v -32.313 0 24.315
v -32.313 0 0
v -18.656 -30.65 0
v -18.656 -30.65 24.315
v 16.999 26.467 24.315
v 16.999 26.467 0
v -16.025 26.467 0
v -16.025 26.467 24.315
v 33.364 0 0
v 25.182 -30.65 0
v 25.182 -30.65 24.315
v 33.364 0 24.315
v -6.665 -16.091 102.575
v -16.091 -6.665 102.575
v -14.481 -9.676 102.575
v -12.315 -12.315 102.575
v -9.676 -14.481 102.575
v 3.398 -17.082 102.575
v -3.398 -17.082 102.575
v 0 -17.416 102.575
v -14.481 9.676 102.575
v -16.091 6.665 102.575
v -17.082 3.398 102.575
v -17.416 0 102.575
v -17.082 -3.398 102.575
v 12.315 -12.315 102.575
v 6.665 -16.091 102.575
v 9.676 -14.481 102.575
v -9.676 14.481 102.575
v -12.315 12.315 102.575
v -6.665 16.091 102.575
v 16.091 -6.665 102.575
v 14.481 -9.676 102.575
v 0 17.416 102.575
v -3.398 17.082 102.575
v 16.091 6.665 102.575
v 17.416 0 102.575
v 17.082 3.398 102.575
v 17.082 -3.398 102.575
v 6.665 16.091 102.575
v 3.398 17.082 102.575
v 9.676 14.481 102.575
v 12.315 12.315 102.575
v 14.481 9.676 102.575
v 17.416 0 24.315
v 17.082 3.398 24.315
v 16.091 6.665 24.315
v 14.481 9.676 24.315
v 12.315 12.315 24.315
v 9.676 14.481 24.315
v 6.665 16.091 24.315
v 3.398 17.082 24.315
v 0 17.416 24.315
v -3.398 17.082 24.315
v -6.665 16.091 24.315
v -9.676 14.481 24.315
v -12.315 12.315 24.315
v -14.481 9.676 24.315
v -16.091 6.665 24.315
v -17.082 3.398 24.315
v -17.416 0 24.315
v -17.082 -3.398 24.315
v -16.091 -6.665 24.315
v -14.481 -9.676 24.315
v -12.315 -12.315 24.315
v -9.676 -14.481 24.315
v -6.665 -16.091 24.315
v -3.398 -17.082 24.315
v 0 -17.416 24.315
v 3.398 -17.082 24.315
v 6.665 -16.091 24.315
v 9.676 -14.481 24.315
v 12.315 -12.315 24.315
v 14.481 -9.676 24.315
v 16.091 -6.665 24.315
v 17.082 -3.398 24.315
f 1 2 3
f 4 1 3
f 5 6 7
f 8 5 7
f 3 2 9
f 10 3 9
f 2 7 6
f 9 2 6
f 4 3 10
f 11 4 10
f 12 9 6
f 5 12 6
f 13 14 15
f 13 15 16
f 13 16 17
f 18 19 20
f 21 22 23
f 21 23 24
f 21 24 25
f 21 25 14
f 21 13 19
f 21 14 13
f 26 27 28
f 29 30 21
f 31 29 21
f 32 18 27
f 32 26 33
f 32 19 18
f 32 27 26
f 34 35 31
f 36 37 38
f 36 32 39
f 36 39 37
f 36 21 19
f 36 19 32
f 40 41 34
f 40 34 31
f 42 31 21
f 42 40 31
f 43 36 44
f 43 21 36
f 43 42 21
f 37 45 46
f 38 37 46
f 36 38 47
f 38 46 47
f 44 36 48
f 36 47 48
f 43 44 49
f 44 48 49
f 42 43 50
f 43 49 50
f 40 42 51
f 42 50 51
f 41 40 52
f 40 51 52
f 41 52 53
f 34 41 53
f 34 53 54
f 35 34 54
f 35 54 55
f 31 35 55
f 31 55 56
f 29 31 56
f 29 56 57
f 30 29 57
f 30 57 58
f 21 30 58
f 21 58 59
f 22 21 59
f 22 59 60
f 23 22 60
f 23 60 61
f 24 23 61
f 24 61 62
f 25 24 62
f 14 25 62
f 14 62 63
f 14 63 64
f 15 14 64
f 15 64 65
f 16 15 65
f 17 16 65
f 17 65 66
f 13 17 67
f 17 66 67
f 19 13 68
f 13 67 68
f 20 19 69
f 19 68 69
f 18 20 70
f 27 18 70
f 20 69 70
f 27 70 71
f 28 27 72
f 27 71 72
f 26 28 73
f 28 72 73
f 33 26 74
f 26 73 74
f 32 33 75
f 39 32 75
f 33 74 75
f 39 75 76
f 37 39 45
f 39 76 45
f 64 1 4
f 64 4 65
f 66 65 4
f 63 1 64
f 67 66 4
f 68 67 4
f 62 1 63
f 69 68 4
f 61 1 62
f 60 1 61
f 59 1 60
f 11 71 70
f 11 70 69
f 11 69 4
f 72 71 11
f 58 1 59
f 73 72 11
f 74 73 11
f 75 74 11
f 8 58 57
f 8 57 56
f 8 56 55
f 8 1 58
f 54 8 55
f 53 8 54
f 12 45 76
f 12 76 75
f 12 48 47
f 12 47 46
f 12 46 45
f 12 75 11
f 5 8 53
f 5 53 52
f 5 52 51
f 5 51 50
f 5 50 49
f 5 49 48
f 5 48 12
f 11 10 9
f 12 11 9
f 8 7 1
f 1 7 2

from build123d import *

# Parameters (mm, degrees)
F1_DEPTH = 24.314562
F2_R     = 17.41648
F3_DEPTH = 102.574684


with BuildPart() as f1:
    # F0 (on Top) → F1 (new body)
    with BuildSketch(Plane.XY):
        Polygon((-16.025186, 26.466794), (-32.313049, 0), (-18.656433, -30.649543), (25.181532, -30.649543), (33.363849, 0), (16.999215, 26.466794), align=None)
    extrude(amount=F1_DEPTH)

    # F2 (on Top) → F3 (join)
    with BuildSketch(Plane.XY):
        Circle(F2_R)
    extrude(amount=F3_DEPTH)


solid = f1.part
